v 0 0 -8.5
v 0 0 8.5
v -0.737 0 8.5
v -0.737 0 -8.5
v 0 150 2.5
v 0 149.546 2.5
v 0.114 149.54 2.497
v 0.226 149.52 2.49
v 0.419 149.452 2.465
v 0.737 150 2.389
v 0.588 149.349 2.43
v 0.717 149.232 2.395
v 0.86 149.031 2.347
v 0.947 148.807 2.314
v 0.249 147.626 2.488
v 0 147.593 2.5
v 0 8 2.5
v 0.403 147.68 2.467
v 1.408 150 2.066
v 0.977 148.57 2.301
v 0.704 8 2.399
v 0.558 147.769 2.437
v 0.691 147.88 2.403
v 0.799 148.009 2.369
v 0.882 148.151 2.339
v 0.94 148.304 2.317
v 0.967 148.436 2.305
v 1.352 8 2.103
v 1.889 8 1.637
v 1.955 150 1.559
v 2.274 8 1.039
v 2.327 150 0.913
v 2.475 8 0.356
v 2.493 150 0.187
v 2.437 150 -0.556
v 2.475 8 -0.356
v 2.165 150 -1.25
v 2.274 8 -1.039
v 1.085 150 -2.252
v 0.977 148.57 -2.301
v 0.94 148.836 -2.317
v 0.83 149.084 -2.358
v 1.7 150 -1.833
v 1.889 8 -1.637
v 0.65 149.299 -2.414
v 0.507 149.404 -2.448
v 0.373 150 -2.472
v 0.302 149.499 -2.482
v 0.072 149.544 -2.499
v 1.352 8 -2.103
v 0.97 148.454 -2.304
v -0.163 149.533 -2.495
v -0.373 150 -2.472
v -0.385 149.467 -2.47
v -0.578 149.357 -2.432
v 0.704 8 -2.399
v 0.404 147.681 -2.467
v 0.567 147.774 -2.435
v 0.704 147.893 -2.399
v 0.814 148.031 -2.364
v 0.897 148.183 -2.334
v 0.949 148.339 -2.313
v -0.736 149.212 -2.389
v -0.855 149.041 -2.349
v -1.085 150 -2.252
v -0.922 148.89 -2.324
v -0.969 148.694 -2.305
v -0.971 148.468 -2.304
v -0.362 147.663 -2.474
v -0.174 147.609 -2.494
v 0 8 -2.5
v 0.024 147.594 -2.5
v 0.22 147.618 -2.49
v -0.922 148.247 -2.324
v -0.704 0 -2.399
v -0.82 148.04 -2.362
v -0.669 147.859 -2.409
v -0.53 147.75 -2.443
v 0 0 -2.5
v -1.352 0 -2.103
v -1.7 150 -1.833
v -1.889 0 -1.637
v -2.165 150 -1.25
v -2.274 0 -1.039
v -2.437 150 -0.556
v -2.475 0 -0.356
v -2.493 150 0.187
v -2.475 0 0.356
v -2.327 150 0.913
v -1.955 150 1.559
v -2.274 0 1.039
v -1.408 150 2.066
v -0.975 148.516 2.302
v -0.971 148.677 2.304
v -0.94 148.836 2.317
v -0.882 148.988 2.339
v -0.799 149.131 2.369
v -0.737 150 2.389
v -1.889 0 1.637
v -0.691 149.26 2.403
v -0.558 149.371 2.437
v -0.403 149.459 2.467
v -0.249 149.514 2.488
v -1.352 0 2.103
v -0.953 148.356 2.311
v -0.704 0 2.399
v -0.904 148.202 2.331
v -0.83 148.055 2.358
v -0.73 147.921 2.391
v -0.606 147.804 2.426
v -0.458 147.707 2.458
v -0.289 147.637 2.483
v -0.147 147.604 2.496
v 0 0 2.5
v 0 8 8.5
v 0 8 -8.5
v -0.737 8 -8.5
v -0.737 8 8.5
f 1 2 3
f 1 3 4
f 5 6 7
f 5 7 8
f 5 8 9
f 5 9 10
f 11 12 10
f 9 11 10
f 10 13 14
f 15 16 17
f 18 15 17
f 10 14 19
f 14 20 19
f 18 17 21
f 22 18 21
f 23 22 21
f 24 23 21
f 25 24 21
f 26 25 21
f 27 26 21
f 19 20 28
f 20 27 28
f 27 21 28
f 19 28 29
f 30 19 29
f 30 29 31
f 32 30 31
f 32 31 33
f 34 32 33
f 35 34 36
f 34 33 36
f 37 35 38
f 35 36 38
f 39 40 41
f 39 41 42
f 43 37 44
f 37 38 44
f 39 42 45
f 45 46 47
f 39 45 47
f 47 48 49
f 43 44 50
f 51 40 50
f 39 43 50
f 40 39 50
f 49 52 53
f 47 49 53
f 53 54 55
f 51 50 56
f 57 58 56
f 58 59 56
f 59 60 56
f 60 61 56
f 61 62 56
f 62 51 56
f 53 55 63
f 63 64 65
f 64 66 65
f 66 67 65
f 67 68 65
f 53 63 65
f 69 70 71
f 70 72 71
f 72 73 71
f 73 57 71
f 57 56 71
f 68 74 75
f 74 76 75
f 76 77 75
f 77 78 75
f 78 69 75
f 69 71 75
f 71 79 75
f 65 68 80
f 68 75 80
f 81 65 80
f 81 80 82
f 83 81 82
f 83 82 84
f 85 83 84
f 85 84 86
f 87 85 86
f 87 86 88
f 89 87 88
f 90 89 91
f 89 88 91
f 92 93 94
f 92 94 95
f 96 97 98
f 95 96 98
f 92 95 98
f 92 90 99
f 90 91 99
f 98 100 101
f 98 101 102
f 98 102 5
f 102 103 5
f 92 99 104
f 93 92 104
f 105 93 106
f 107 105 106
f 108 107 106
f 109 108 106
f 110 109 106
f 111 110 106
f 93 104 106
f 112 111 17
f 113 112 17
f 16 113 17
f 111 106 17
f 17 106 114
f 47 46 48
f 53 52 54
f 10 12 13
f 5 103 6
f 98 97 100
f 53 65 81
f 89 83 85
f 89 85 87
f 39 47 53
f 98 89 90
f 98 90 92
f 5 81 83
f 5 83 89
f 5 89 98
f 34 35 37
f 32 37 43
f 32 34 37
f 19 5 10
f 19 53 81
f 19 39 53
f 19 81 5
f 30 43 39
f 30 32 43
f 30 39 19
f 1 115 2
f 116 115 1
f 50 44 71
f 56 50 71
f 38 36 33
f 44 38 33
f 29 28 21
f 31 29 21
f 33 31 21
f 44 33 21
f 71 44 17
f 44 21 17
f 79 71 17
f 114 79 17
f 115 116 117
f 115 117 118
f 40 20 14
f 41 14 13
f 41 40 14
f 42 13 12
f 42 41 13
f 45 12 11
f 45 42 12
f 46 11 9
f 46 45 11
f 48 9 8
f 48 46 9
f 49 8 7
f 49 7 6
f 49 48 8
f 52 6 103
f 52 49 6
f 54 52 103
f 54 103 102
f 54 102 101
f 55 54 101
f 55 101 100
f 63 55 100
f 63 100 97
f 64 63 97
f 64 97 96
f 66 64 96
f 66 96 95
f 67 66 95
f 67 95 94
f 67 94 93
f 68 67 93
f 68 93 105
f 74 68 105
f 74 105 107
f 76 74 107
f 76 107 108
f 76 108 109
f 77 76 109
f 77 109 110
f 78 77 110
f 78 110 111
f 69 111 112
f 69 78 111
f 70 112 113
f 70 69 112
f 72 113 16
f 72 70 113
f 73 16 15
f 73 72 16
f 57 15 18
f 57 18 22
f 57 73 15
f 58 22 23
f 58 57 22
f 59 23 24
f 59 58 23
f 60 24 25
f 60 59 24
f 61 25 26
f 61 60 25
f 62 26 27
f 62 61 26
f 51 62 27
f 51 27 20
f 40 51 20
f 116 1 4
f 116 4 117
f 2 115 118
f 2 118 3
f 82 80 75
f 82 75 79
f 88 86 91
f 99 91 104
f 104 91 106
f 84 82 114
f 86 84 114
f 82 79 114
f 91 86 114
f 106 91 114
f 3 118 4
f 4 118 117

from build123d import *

# Parameters (mm, degrees)
SKETCH1_R               = 2.5
BOSS_EXTRUDE1_DEPTH     = 150
CUT_EXTRUDE1_DEPTH      = 8
BASE_FLANGE1_DEPTH      = 0.7366
CUT_EXTRUDE2_DEPTH      = 151.261438832
CUT_EXTRUDE2_DEPTH_BACK = 151.261438832
SKETCH9_R               = 0.976503682


# Sheet-metal steps are written as plain solids
with BuildPart() as part:
    # Sketch1 → Boss-Extrude1 (new body)
    with BuildSketch(Plane(origin=(0, 0, 0), x_dir=(1, 0, 0), z_dir=(0, 1, 0))):
        with Locations(Location((0, 0, 0), (0, 0, 270))):
            Circle(SKETCH1_R)
    extrude(amount=BOSS_EXTRUDE1_DEPTH)

    # Sketch2 → Cut-Extrude1 (cut)
    with BuildSketch(Plane.XZ):
        with BuildLine():
            Line((0, -2.5), (0, 2.5))
            ThreePointArc((0, 2.5), (2.5, 0), (0, -2.5))
        make_face()
    extrude(amount=-CUT_EXTRUDE1_DEPTH, mode=Mode.SUBTRACT)

    # Sketch9 → Cut-Extrude2 (cut, two sides: drawn at the far end of the back side and taken through both)
    with BuildSketch(Plane.XY.offset(-CUT_EXTRUDE2_DEPTH_BACK)):
        with Locations((0, 148.569798757)):
            Circle(SKETCH9_R)
    extrude(amount=CUT_EXTRUDE2_DEPTH + CUT_EXTRUDE2_DEPTH_BACK, mode=Mode.SUBTRACT)


with BuildPart() as body_2:
    # Sketch4 → Base-Flange1 (new body)
    with BuildSketch(Plane(origin=(0, 0, 0), x_dir=(0, 0, -1), z_dir=(1, 0, 0))):
        Polygon((-2.5, 8), (-8.5, 8), (-8.5, 0), (-2.5, 0), (2.5, 0), (8.5, 0), (8.5, 8), (2.5, 8), align=None)
    extrude(amount=-BASE_FLANGE1_DEPTH)


solid = Compound([part.part, body_2.part])
